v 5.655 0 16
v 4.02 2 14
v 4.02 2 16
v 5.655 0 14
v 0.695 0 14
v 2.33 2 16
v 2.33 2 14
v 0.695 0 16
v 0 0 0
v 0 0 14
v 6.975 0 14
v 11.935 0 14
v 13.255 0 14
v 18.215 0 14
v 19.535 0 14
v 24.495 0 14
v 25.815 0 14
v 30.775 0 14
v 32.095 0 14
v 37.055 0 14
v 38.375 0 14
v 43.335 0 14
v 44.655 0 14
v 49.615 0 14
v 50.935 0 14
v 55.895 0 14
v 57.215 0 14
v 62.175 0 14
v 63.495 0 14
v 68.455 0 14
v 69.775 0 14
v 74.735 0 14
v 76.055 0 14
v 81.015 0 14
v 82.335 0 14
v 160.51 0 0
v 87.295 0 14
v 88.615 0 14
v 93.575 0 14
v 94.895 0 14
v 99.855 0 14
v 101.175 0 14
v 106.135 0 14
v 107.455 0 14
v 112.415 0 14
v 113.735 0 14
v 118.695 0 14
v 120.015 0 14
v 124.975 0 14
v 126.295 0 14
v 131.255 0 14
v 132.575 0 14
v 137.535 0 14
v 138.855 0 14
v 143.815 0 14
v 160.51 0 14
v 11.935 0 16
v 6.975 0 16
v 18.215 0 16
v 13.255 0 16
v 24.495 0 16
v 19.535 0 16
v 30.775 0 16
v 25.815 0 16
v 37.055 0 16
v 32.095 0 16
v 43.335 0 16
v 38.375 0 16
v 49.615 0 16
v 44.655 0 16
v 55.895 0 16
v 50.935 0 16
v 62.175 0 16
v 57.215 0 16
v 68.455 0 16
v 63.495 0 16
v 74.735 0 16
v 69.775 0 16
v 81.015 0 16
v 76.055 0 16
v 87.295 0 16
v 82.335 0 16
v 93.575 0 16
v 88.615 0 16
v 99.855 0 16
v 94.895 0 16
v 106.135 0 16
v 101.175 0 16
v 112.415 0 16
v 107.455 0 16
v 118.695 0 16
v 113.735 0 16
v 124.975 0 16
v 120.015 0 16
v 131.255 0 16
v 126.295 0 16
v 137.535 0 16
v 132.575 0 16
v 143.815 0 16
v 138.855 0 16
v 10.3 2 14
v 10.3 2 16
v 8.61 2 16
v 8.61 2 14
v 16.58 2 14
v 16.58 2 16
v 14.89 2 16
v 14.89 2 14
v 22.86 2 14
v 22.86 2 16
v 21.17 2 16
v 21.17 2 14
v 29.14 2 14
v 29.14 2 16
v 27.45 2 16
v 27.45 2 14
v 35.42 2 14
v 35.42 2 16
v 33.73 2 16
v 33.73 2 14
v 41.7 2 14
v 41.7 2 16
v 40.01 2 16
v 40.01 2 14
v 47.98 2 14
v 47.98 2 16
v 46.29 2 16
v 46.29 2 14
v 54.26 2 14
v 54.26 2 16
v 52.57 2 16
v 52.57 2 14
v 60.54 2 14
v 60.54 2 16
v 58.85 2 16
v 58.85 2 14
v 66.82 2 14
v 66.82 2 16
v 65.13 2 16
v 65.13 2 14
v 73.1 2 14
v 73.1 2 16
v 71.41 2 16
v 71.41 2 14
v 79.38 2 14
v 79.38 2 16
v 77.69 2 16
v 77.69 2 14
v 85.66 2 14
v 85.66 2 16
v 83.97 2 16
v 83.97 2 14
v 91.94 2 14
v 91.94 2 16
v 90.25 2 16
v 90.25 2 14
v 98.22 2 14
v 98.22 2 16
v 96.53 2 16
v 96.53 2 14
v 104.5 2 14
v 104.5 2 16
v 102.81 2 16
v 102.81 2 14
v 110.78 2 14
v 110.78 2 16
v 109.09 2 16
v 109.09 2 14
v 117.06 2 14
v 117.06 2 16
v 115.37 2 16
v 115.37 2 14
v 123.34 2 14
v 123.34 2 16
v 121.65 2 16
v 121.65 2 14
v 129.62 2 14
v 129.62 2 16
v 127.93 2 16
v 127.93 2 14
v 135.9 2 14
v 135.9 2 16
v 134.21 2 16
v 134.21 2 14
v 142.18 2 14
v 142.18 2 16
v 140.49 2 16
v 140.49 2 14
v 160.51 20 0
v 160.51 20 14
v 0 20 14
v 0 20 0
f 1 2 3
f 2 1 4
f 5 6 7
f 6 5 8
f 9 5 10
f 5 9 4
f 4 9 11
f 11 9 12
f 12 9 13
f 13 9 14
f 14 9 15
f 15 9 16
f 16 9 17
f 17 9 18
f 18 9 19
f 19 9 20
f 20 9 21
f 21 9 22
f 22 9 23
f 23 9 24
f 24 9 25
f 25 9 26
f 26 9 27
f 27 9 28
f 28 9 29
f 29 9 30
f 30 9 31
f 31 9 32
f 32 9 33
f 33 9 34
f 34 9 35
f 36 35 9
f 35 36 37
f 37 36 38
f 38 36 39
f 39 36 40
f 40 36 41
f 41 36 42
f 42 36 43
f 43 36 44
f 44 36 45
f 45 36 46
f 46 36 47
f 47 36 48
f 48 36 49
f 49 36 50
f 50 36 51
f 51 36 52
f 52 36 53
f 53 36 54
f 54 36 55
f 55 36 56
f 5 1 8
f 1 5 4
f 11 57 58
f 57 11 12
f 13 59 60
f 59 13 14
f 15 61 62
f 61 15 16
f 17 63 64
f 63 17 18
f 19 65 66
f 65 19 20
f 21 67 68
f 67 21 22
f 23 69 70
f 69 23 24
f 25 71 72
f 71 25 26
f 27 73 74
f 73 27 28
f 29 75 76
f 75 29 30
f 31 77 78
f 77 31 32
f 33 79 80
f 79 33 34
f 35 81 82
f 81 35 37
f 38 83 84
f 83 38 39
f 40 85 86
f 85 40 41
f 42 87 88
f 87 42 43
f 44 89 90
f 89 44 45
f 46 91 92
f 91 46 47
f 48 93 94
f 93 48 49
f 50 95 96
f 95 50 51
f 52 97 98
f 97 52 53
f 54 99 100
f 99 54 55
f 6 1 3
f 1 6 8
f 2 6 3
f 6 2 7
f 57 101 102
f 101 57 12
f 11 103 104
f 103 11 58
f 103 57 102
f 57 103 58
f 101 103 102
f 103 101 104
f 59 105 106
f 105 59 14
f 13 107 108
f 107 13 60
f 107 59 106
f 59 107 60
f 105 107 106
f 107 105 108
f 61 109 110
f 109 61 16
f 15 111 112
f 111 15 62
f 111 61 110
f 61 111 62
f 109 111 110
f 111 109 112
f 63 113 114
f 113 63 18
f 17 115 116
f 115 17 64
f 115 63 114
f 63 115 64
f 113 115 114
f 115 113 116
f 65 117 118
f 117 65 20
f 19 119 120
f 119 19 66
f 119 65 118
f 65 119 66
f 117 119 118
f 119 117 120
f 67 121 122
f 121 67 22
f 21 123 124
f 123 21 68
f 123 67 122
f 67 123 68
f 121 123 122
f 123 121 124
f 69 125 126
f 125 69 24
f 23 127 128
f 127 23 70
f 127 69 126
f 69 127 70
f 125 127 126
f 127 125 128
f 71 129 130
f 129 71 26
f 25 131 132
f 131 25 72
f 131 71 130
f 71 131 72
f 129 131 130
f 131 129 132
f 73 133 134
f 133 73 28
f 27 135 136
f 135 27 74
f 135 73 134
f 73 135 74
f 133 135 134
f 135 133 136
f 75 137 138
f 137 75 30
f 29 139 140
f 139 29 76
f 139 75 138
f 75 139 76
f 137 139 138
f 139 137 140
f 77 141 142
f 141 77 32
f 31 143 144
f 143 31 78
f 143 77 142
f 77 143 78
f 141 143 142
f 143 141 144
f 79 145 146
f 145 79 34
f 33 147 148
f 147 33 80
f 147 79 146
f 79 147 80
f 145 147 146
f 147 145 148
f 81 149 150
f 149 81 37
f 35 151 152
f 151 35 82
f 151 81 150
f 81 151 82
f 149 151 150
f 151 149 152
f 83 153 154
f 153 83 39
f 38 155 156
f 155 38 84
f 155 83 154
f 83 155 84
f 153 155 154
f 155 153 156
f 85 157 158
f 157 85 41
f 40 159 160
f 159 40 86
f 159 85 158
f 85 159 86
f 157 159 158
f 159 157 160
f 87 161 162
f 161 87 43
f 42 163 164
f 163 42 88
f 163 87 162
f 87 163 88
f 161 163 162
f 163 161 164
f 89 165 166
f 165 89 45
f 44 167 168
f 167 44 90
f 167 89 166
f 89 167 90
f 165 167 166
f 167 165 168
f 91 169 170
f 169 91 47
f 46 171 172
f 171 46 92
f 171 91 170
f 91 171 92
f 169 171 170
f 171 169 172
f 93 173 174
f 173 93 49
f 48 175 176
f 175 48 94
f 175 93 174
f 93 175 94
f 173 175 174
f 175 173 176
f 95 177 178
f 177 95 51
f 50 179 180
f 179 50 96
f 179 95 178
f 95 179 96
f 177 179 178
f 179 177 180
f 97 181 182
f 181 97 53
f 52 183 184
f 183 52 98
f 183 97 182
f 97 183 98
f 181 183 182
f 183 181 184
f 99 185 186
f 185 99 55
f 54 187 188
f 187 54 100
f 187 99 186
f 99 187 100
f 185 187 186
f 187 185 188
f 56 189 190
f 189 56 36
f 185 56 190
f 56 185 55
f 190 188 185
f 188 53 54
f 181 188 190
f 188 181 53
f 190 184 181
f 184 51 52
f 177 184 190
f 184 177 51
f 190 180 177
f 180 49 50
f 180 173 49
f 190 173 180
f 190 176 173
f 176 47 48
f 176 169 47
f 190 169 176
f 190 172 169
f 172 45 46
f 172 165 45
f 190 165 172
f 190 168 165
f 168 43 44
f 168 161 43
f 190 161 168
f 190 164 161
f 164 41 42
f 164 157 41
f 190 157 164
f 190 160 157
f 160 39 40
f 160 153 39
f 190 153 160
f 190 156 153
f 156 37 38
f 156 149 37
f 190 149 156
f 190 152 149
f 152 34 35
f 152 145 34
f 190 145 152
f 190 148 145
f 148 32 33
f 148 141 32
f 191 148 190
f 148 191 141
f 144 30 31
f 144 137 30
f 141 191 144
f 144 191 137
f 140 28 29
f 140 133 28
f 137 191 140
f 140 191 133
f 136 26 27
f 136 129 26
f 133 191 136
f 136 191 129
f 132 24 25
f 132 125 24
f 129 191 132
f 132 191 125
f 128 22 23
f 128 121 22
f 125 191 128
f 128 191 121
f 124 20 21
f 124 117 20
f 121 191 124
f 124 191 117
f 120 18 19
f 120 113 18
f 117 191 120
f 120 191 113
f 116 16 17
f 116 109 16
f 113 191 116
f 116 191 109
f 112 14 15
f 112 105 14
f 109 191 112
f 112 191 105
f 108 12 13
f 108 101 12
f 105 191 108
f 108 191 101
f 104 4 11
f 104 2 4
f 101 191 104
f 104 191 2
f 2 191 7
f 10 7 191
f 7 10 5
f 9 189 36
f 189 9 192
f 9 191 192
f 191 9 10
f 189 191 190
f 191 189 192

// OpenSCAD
$fn = 32;

// ----------------------------------------------------------------------
// Gear rack: m=2 z=23, 160.51 x 20 x 16 mm
// ----------------------------------------------------------------------

// --- parameters (mm) ---
length = 160.51;          // rack length, X
width = 20;               // rack width, Y
height = 16;              // overall height, Z
module_m = 2;             // module
back_t = 14;              // tooth root line height
pitch = 6.28;             // circular pitch
tip_w = 1.69;             // tooth thickness at the tip
root_w = 4.96;            // tooth thickness at the root line
sink = 0.6;               // tooth root overlap into the body

tooth_span = 144.51;

module tooth(x0) {
  /* 20 deg flank profile, sunk into the body for a positive overlap */
  translate([x0, 0, back_t - sink])
    linear_extrude(height = height - back_t + sink)
      polygon(points = [[-root_w / 2, 0], [root_w / 2, 0],
                        [tip_w / 2, height - back_t],
                        [-tip_w / 2, height - back_t]]);
}

difference() {
  union() {
    cube([length, width, back_t]);
    for (i = [0 : 23 - 1])
      tooth((i + 0.5) * pitch + (tooth_span - 23 * pitch) / 2);
  }
}
